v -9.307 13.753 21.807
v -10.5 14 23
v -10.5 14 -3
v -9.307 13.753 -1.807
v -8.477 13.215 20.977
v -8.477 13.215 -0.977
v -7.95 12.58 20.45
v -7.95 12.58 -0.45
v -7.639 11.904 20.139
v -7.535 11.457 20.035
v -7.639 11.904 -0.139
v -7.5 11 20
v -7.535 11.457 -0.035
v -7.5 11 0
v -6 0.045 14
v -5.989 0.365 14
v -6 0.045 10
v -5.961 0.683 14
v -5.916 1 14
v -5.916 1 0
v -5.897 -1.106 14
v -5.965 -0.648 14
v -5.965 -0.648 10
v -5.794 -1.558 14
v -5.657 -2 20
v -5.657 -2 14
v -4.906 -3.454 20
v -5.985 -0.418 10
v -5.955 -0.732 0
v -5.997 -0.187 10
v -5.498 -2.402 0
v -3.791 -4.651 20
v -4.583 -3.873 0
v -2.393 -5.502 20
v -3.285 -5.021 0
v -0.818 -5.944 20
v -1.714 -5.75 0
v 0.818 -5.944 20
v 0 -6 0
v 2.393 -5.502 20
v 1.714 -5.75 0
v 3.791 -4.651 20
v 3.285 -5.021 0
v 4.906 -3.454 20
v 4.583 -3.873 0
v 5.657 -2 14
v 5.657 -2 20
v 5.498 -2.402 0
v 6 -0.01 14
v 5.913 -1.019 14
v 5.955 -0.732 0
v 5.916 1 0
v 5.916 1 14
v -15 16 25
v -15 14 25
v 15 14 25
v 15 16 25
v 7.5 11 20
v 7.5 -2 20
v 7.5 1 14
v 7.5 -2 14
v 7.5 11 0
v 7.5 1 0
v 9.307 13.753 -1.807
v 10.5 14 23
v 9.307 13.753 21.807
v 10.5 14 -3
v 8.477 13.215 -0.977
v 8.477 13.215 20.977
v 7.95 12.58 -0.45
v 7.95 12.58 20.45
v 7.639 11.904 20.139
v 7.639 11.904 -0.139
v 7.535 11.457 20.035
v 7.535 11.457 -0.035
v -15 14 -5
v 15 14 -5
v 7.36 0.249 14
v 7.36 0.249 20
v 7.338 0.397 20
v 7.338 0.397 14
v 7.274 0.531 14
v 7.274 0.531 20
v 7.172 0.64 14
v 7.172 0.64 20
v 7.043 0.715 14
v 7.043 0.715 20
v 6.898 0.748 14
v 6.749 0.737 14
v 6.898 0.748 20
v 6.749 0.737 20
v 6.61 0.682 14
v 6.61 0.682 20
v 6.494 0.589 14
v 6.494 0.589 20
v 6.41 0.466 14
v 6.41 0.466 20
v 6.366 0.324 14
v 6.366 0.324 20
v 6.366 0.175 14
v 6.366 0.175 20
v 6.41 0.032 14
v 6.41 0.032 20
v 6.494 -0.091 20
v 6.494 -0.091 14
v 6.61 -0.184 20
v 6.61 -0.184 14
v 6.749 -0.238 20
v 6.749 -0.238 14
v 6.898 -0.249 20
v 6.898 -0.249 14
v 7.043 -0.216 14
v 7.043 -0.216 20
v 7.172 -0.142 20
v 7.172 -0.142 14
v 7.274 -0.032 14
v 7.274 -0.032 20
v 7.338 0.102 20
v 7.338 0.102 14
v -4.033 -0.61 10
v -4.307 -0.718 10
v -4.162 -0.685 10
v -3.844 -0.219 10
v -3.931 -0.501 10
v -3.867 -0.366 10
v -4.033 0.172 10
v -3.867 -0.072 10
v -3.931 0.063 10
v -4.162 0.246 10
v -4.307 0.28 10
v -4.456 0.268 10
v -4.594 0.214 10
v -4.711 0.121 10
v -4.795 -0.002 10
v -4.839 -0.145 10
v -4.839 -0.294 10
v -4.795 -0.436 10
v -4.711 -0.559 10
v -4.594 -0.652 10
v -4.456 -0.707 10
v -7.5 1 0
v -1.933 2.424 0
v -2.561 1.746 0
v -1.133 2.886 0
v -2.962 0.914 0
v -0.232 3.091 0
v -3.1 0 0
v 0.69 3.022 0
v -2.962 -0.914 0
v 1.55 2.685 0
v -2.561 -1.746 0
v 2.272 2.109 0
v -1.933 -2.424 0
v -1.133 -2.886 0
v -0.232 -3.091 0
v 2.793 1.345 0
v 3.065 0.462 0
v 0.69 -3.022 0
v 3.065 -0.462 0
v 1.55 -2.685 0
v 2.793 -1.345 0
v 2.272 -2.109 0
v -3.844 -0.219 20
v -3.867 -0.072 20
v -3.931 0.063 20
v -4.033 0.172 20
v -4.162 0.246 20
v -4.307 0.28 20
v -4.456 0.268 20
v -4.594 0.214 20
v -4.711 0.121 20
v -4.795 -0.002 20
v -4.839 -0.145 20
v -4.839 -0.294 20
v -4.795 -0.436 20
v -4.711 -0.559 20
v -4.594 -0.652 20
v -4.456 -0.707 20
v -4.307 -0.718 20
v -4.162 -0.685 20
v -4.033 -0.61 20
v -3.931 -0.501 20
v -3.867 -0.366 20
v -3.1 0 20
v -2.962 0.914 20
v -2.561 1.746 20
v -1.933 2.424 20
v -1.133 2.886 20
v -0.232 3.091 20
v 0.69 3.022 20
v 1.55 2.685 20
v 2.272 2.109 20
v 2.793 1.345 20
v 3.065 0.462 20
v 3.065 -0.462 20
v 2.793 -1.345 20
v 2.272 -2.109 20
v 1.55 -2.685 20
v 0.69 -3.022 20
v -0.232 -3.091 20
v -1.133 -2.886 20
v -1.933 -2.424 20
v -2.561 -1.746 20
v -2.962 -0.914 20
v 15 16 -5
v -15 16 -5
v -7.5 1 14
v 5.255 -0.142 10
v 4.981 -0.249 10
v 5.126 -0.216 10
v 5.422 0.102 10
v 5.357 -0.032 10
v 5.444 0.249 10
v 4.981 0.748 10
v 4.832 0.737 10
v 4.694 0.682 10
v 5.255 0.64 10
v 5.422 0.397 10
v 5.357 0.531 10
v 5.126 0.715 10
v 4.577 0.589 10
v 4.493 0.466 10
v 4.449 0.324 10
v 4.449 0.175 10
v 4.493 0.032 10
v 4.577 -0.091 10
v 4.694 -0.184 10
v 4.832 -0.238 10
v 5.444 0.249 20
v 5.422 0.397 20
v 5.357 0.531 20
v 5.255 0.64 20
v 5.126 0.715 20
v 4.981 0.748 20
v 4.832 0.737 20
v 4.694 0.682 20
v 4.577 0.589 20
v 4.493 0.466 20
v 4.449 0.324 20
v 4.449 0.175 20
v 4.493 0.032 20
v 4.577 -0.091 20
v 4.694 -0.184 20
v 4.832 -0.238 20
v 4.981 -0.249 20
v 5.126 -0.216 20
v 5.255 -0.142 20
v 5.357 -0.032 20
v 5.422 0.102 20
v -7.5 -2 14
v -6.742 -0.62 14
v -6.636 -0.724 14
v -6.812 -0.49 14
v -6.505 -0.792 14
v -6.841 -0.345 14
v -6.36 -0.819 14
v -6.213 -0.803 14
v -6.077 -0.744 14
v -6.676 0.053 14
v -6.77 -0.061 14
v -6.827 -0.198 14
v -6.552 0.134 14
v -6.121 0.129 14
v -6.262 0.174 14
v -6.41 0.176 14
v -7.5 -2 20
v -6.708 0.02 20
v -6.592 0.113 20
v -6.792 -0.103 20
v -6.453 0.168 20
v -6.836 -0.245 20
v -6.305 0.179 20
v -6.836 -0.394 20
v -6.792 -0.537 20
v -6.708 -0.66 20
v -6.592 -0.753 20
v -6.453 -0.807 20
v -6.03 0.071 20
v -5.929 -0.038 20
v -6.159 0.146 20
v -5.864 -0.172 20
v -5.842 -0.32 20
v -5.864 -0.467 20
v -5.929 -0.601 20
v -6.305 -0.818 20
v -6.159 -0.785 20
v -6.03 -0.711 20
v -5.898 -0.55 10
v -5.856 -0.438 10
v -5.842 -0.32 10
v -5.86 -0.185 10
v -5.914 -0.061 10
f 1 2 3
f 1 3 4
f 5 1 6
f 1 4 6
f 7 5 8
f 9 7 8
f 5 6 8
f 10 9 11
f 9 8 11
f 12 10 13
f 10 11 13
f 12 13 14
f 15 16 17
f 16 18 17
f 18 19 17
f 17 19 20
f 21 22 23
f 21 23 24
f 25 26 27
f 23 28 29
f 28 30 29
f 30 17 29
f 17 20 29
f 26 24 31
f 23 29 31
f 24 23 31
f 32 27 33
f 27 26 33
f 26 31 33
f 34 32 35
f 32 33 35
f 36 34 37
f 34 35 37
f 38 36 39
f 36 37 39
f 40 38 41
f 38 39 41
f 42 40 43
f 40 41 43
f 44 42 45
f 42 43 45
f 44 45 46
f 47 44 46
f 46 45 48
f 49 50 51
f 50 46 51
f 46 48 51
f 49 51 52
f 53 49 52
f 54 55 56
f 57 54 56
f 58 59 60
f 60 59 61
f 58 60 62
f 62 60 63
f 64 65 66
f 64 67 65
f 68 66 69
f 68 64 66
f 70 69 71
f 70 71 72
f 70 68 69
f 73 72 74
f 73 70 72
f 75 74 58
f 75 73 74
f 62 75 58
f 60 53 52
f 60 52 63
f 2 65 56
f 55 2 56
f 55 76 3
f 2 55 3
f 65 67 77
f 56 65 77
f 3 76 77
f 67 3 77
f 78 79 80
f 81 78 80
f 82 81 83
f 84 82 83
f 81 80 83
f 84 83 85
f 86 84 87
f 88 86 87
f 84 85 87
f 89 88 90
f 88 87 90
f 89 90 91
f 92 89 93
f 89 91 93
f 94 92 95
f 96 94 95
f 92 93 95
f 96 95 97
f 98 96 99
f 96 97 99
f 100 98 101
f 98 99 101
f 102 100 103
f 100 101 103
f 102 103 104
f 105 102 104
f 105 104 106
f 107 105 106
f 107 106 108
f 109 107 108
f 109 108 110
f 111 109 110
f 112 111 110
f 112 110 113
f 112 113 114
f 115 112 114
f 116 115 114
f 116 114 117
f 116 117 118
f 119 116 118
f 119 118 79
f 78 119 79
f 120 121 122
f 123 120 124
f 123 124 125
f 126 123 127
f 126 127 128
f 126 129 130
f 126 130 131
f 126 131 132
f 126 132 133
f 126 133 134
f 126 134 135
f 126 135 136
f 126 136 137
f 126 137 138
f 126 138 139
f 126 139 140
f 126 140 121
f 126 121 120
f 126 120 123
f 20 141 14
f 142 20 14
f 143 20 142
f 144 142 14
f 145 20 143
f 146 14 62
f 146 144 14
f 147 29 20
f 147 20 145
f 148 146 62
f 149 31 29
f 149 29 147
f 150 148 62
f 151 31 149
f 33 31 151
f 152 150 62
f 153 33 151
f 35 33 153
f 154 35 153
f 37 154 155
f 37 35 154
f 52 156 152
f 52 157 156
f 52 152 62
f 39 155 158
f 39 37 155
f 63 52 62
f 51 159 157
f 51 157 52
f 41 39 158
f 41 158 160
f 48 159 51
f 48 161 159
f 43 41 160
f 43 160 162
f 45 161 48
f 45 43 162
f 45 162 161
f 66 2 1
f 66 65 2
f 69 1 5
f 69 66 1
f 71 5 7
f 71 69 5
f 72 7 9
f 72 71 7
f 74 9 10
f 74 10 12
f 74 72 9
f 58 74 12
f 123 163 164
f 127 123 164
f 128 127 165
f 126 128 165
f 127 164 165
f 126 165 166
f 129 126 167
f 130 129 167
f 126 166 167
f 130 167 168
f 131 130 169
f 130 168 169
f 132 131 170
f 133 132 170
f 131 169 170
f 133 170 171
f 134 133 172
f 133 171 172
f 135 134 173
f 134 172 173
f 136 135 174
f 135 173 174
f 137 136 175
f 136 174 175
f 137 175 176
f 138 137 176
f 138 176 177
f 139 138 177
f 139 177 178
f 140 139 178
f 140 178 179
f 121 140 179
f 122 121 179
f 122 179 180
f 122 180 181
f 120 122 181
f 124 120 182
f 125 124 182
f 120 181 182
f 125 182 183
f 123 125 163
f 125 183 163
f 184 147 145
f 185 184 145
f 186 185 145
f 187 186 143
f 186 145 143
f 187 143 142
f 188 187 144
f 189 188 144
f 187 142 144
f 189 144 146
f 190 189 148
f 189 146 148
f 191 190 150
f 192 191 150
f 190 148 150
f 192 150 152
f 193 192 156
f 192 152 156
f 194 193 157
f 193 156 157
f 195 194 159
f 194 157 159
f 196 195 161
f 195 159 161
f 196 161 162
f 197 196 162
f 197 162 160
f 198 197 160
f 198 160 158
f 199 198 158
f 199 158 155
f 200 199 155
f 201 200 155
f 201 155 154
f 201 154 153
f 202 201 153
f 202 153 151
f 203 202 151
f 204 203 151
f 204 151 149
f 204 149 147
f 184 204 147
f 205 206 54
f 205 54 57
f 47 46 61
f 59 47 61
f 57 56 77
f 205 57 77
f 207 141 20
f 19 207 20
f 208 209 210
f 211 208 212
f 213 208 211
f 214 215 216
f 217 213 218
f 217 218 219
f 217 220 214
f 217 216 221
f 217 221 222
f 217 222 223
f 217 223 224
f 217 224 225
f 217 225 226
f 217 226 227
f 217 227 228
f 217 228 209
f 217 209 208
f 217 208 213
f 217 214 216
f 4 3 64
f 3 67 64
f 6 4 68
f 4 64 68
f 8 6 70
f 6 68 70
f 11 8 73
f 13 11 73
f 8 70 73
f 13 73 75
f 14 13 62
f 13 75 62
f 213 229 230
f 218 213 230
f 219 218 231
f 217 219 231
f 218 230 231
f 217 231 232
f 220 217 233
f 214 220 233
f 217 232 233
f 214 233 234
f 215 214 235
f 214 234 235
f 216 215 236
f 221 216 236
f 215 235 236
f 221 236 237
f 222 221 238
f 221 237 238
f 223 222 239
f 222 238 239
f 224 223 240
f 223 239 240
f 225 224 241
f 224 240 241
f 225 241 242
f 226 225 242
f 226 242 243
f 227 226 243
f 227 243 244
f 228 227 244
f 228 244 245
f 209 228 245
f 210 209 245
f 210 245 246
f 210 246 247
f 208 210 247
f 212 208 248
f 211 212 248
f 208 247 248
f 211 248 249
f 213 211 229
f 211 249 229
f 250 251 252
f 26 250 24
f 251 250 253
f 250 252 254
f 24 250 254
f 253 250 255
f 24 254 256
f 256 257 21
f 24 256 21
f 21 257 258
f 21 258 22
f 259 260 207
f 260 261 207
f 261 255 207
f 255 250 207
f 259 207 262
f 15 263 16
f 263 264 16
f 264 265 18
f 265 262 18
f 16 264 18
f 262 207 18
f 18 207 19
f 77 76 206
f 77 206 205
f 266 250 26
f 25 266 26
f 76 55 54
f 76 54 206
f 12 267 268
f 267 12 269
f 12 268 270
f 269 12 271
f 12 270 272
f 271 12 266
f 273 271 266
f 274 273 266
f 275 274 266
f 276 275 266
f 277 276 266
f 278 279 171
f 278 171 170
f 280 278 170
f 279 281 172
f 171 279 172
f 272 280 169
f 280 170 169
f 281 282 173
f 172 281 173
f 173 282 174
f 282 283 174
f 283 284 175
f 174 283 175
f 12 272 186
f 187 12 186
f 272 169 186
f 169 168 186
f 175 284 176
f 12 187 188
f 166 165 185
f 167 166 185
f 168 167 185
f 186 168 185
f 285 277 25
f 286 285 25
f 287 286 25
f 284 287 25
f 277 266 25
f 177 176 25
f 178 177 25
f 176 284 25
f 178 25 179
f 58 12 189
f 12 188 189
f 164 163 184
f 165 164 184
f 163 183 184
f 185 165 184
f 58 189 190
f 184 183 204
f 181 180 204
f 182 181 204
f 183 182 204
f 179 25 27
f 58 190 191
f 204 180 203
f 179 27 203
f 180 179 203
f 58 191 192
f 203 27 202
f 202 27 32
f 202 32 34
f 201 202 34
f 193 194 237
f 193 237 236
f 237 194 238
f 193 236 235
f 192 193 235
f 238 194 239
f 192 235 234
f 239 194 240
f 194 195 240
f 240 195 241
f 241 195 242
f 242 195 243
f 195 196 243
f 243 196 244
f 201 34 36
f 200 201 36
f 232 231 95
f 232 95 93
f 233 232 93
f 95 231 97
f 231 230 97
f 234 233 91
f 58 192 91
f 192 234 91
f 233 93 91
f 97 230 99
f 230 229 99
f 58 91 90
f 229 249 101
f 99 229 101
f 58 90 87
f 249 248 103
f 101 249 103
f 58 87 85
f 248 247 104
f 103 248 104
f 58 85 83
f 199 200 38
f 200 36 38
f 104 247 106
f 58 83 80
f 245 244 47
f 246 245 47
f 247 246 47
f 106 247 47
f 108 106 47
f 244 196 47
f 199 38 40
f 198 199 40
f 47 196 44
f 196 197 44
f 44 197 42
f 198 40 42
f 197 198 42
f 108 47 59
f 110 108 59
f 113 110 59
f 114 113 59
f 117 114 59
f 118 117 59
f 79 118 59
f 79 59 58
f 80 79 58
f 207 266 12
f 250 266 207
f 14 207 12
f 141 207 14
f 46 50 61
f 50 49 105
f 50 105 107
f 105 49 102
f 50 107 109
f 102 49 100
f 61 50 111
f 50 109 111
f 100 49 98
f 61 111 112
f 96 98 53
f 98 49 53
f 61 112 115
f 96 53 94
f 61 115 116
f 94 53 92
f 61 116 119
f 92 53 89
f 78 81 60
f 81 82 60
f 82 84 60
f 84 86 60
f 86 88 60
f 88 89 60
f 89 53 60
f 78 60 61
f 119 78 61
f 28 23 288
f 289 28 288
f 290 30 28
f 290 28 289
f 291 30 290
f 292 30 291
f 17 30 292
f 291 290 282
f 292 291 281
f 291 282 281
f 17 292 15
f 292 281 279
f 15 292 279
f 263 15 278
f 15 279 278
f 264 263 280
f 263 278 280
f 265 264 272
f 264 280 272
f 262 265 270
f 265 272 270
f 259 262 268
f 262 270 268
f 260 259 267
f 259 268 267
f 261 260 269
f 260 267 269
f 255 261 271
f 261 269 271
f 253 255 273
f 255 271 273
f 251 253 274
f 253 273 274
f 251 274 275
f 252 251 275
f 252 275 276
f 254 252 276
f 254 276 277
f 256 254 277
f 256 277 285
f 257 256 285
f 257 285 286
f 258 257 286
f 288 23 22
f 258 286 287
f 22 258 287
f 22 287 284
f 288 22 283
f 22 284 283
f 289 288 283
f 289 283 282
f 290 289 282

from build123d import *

# Parameters (mm, degrees)
SKETCH1_R           = 6
BOSS_EXTRUDE1_DEPTH = 20
BOSS_EXTRUDE2_START = 1
SKETCH2_W           = 15
SKETCH2_H           = 20
BOSS_EXTRUDE2_DEPTH = 5
SKETCH3_R           = 3.1
CUT_EXTRUDE1_DEPTH  = 23.186707732
BOSS_EXTRUDE3_START = -6
BOSS_EXTRUDE3_DEPTH = 6
SKETCH5_R           = 0.5
CUT_EXTRUDE2_DEPTH  = 10
SKETCH6_W           = 15
SKETCH6_H           = 20
BOSS_EXTRUDE4_DEPTH = 8
SKETCH7_W           = 30
SKETCH7_H           = 30
BOSS_EXTRUDE5_DEPTH = 2
FILLET1_R           = 3


with BuildPart() as part:
    # Sketch1 → Boss-Extrude1 (new body)
    with BuildSketch(Plane.XY):
        Circle(SKETCH1_R)
    extrude(amount=BOSS_EXTRUDE1_DEPTH)

    # Sketch2 → Boss-Extrude2 (add)
    with BuildSketch(Plane(origin=(0, 0, 0), x_dir=(1, 0, 0), z_dir=(0, 1, 0)).offset(BOSS_EXTRUDE2_START)):
        with Locations((0, -10)):
            Rectangle(SKETCH2_W, SKETCH2_H)
    extrude(amount=BOSS_EXTRUDE2_DEPTH)

    # Sketch3 → Cut-Extrude1 (cut, through all)
    with BuildSketch(Plane(origin=(0, 0, 0), x_dir=(-1, 0, 0), z_dir=(0, 0, -1))):
        Circle(SKETCH3_R)
    extrude(amount=-CUT_EXTRUDE1_DEPTH, mode=Mode.SUBTRACT)

    # Sketch4 → Boss-Extrude3 (add)
    with BuildSketch(Plane.XY.offset(20).offset(BOSS_EXTRUDE3_START)):
        with BuildLine():
            ThreePointArc((5.916079783, 1), (5.977725364, -0.516526349), (5.656854249, -2))
            Line((5.656854249, -2), (7.5, -2))
            Line((7.5, -2), (7.5, 1))
            Line((7.5, 1), (5.916079783, 1))
        make_face()
        with BuildLine():
            Line((-7.5, -2), (-5.656854249, -2))
            ThreePointArc((-5.656854249, -2), (-5.977725364, -0.516526349), (-5.916079783, 1))
            Line((-5.916079783, 1), (-7.5, 1))
            Line((-7.5, 1), (-7.5, -2))
        make_face()
    extrude(amount=BOSS_EXTRUDE3_DEPTH)

    # Sketch5 → Cut-Extrude2 (cut)
    with BuildSketch(Plane.XY.offset(20)):
        with Locations((-6.341942864, -0.319782293)):
            Circle(SKETCH5_R)
        with Locations((-4.344480544, -0.219063461)):
            Circle(SKETCH5_R)
        with Locations((4.94371924, 0.249279111)):
            Circle(SKETCH5_R)
        with Locations((6.860426101, 0.249279111)):
            Circle(SKETCH5_R)
    extrude(amount=-CUT_EXTRUDE2_DEPTH, mode=Mode.SUBTRACT)

    # Sketch6 → Boss-Extrude4 (add)
    with BuildSketch(Plane(origin=(0, 6, 0), x_dir=(1, 0, 0), z_dir=(0, 1, 0))):
        with Locations((0, -10)):
            Rectangle(SKETCH6_W, SKETCH6_H)
    extrude(amount=BOSS_EXTRUDE4_DEPTH)

    # Sketch7 → Boss-Extrude5 (add)
    with BuildSketch(Plane(origin=(0, 14, 0), x_dir=(1, 0, 0), z_dir=(0, 1, 0))):
        with Locations((0, -10)):
            Rectangle(SKETCH7_W, SKETCH7_H)
    extrude(amount=BOSS_EXTRUDE5_DEPTH)

    # Fillet1
    fillet1_edges = [part.edges().sort_by_distance(p)[0] for p in [
        (0, 14, 0),
        (-7.5, 14, 10),
        (0, 14, 20),
        (7.5, 14, 10),
    ]]
    fillet(fillet1_edges, radius=FILLET1_R)


solid = part.part
